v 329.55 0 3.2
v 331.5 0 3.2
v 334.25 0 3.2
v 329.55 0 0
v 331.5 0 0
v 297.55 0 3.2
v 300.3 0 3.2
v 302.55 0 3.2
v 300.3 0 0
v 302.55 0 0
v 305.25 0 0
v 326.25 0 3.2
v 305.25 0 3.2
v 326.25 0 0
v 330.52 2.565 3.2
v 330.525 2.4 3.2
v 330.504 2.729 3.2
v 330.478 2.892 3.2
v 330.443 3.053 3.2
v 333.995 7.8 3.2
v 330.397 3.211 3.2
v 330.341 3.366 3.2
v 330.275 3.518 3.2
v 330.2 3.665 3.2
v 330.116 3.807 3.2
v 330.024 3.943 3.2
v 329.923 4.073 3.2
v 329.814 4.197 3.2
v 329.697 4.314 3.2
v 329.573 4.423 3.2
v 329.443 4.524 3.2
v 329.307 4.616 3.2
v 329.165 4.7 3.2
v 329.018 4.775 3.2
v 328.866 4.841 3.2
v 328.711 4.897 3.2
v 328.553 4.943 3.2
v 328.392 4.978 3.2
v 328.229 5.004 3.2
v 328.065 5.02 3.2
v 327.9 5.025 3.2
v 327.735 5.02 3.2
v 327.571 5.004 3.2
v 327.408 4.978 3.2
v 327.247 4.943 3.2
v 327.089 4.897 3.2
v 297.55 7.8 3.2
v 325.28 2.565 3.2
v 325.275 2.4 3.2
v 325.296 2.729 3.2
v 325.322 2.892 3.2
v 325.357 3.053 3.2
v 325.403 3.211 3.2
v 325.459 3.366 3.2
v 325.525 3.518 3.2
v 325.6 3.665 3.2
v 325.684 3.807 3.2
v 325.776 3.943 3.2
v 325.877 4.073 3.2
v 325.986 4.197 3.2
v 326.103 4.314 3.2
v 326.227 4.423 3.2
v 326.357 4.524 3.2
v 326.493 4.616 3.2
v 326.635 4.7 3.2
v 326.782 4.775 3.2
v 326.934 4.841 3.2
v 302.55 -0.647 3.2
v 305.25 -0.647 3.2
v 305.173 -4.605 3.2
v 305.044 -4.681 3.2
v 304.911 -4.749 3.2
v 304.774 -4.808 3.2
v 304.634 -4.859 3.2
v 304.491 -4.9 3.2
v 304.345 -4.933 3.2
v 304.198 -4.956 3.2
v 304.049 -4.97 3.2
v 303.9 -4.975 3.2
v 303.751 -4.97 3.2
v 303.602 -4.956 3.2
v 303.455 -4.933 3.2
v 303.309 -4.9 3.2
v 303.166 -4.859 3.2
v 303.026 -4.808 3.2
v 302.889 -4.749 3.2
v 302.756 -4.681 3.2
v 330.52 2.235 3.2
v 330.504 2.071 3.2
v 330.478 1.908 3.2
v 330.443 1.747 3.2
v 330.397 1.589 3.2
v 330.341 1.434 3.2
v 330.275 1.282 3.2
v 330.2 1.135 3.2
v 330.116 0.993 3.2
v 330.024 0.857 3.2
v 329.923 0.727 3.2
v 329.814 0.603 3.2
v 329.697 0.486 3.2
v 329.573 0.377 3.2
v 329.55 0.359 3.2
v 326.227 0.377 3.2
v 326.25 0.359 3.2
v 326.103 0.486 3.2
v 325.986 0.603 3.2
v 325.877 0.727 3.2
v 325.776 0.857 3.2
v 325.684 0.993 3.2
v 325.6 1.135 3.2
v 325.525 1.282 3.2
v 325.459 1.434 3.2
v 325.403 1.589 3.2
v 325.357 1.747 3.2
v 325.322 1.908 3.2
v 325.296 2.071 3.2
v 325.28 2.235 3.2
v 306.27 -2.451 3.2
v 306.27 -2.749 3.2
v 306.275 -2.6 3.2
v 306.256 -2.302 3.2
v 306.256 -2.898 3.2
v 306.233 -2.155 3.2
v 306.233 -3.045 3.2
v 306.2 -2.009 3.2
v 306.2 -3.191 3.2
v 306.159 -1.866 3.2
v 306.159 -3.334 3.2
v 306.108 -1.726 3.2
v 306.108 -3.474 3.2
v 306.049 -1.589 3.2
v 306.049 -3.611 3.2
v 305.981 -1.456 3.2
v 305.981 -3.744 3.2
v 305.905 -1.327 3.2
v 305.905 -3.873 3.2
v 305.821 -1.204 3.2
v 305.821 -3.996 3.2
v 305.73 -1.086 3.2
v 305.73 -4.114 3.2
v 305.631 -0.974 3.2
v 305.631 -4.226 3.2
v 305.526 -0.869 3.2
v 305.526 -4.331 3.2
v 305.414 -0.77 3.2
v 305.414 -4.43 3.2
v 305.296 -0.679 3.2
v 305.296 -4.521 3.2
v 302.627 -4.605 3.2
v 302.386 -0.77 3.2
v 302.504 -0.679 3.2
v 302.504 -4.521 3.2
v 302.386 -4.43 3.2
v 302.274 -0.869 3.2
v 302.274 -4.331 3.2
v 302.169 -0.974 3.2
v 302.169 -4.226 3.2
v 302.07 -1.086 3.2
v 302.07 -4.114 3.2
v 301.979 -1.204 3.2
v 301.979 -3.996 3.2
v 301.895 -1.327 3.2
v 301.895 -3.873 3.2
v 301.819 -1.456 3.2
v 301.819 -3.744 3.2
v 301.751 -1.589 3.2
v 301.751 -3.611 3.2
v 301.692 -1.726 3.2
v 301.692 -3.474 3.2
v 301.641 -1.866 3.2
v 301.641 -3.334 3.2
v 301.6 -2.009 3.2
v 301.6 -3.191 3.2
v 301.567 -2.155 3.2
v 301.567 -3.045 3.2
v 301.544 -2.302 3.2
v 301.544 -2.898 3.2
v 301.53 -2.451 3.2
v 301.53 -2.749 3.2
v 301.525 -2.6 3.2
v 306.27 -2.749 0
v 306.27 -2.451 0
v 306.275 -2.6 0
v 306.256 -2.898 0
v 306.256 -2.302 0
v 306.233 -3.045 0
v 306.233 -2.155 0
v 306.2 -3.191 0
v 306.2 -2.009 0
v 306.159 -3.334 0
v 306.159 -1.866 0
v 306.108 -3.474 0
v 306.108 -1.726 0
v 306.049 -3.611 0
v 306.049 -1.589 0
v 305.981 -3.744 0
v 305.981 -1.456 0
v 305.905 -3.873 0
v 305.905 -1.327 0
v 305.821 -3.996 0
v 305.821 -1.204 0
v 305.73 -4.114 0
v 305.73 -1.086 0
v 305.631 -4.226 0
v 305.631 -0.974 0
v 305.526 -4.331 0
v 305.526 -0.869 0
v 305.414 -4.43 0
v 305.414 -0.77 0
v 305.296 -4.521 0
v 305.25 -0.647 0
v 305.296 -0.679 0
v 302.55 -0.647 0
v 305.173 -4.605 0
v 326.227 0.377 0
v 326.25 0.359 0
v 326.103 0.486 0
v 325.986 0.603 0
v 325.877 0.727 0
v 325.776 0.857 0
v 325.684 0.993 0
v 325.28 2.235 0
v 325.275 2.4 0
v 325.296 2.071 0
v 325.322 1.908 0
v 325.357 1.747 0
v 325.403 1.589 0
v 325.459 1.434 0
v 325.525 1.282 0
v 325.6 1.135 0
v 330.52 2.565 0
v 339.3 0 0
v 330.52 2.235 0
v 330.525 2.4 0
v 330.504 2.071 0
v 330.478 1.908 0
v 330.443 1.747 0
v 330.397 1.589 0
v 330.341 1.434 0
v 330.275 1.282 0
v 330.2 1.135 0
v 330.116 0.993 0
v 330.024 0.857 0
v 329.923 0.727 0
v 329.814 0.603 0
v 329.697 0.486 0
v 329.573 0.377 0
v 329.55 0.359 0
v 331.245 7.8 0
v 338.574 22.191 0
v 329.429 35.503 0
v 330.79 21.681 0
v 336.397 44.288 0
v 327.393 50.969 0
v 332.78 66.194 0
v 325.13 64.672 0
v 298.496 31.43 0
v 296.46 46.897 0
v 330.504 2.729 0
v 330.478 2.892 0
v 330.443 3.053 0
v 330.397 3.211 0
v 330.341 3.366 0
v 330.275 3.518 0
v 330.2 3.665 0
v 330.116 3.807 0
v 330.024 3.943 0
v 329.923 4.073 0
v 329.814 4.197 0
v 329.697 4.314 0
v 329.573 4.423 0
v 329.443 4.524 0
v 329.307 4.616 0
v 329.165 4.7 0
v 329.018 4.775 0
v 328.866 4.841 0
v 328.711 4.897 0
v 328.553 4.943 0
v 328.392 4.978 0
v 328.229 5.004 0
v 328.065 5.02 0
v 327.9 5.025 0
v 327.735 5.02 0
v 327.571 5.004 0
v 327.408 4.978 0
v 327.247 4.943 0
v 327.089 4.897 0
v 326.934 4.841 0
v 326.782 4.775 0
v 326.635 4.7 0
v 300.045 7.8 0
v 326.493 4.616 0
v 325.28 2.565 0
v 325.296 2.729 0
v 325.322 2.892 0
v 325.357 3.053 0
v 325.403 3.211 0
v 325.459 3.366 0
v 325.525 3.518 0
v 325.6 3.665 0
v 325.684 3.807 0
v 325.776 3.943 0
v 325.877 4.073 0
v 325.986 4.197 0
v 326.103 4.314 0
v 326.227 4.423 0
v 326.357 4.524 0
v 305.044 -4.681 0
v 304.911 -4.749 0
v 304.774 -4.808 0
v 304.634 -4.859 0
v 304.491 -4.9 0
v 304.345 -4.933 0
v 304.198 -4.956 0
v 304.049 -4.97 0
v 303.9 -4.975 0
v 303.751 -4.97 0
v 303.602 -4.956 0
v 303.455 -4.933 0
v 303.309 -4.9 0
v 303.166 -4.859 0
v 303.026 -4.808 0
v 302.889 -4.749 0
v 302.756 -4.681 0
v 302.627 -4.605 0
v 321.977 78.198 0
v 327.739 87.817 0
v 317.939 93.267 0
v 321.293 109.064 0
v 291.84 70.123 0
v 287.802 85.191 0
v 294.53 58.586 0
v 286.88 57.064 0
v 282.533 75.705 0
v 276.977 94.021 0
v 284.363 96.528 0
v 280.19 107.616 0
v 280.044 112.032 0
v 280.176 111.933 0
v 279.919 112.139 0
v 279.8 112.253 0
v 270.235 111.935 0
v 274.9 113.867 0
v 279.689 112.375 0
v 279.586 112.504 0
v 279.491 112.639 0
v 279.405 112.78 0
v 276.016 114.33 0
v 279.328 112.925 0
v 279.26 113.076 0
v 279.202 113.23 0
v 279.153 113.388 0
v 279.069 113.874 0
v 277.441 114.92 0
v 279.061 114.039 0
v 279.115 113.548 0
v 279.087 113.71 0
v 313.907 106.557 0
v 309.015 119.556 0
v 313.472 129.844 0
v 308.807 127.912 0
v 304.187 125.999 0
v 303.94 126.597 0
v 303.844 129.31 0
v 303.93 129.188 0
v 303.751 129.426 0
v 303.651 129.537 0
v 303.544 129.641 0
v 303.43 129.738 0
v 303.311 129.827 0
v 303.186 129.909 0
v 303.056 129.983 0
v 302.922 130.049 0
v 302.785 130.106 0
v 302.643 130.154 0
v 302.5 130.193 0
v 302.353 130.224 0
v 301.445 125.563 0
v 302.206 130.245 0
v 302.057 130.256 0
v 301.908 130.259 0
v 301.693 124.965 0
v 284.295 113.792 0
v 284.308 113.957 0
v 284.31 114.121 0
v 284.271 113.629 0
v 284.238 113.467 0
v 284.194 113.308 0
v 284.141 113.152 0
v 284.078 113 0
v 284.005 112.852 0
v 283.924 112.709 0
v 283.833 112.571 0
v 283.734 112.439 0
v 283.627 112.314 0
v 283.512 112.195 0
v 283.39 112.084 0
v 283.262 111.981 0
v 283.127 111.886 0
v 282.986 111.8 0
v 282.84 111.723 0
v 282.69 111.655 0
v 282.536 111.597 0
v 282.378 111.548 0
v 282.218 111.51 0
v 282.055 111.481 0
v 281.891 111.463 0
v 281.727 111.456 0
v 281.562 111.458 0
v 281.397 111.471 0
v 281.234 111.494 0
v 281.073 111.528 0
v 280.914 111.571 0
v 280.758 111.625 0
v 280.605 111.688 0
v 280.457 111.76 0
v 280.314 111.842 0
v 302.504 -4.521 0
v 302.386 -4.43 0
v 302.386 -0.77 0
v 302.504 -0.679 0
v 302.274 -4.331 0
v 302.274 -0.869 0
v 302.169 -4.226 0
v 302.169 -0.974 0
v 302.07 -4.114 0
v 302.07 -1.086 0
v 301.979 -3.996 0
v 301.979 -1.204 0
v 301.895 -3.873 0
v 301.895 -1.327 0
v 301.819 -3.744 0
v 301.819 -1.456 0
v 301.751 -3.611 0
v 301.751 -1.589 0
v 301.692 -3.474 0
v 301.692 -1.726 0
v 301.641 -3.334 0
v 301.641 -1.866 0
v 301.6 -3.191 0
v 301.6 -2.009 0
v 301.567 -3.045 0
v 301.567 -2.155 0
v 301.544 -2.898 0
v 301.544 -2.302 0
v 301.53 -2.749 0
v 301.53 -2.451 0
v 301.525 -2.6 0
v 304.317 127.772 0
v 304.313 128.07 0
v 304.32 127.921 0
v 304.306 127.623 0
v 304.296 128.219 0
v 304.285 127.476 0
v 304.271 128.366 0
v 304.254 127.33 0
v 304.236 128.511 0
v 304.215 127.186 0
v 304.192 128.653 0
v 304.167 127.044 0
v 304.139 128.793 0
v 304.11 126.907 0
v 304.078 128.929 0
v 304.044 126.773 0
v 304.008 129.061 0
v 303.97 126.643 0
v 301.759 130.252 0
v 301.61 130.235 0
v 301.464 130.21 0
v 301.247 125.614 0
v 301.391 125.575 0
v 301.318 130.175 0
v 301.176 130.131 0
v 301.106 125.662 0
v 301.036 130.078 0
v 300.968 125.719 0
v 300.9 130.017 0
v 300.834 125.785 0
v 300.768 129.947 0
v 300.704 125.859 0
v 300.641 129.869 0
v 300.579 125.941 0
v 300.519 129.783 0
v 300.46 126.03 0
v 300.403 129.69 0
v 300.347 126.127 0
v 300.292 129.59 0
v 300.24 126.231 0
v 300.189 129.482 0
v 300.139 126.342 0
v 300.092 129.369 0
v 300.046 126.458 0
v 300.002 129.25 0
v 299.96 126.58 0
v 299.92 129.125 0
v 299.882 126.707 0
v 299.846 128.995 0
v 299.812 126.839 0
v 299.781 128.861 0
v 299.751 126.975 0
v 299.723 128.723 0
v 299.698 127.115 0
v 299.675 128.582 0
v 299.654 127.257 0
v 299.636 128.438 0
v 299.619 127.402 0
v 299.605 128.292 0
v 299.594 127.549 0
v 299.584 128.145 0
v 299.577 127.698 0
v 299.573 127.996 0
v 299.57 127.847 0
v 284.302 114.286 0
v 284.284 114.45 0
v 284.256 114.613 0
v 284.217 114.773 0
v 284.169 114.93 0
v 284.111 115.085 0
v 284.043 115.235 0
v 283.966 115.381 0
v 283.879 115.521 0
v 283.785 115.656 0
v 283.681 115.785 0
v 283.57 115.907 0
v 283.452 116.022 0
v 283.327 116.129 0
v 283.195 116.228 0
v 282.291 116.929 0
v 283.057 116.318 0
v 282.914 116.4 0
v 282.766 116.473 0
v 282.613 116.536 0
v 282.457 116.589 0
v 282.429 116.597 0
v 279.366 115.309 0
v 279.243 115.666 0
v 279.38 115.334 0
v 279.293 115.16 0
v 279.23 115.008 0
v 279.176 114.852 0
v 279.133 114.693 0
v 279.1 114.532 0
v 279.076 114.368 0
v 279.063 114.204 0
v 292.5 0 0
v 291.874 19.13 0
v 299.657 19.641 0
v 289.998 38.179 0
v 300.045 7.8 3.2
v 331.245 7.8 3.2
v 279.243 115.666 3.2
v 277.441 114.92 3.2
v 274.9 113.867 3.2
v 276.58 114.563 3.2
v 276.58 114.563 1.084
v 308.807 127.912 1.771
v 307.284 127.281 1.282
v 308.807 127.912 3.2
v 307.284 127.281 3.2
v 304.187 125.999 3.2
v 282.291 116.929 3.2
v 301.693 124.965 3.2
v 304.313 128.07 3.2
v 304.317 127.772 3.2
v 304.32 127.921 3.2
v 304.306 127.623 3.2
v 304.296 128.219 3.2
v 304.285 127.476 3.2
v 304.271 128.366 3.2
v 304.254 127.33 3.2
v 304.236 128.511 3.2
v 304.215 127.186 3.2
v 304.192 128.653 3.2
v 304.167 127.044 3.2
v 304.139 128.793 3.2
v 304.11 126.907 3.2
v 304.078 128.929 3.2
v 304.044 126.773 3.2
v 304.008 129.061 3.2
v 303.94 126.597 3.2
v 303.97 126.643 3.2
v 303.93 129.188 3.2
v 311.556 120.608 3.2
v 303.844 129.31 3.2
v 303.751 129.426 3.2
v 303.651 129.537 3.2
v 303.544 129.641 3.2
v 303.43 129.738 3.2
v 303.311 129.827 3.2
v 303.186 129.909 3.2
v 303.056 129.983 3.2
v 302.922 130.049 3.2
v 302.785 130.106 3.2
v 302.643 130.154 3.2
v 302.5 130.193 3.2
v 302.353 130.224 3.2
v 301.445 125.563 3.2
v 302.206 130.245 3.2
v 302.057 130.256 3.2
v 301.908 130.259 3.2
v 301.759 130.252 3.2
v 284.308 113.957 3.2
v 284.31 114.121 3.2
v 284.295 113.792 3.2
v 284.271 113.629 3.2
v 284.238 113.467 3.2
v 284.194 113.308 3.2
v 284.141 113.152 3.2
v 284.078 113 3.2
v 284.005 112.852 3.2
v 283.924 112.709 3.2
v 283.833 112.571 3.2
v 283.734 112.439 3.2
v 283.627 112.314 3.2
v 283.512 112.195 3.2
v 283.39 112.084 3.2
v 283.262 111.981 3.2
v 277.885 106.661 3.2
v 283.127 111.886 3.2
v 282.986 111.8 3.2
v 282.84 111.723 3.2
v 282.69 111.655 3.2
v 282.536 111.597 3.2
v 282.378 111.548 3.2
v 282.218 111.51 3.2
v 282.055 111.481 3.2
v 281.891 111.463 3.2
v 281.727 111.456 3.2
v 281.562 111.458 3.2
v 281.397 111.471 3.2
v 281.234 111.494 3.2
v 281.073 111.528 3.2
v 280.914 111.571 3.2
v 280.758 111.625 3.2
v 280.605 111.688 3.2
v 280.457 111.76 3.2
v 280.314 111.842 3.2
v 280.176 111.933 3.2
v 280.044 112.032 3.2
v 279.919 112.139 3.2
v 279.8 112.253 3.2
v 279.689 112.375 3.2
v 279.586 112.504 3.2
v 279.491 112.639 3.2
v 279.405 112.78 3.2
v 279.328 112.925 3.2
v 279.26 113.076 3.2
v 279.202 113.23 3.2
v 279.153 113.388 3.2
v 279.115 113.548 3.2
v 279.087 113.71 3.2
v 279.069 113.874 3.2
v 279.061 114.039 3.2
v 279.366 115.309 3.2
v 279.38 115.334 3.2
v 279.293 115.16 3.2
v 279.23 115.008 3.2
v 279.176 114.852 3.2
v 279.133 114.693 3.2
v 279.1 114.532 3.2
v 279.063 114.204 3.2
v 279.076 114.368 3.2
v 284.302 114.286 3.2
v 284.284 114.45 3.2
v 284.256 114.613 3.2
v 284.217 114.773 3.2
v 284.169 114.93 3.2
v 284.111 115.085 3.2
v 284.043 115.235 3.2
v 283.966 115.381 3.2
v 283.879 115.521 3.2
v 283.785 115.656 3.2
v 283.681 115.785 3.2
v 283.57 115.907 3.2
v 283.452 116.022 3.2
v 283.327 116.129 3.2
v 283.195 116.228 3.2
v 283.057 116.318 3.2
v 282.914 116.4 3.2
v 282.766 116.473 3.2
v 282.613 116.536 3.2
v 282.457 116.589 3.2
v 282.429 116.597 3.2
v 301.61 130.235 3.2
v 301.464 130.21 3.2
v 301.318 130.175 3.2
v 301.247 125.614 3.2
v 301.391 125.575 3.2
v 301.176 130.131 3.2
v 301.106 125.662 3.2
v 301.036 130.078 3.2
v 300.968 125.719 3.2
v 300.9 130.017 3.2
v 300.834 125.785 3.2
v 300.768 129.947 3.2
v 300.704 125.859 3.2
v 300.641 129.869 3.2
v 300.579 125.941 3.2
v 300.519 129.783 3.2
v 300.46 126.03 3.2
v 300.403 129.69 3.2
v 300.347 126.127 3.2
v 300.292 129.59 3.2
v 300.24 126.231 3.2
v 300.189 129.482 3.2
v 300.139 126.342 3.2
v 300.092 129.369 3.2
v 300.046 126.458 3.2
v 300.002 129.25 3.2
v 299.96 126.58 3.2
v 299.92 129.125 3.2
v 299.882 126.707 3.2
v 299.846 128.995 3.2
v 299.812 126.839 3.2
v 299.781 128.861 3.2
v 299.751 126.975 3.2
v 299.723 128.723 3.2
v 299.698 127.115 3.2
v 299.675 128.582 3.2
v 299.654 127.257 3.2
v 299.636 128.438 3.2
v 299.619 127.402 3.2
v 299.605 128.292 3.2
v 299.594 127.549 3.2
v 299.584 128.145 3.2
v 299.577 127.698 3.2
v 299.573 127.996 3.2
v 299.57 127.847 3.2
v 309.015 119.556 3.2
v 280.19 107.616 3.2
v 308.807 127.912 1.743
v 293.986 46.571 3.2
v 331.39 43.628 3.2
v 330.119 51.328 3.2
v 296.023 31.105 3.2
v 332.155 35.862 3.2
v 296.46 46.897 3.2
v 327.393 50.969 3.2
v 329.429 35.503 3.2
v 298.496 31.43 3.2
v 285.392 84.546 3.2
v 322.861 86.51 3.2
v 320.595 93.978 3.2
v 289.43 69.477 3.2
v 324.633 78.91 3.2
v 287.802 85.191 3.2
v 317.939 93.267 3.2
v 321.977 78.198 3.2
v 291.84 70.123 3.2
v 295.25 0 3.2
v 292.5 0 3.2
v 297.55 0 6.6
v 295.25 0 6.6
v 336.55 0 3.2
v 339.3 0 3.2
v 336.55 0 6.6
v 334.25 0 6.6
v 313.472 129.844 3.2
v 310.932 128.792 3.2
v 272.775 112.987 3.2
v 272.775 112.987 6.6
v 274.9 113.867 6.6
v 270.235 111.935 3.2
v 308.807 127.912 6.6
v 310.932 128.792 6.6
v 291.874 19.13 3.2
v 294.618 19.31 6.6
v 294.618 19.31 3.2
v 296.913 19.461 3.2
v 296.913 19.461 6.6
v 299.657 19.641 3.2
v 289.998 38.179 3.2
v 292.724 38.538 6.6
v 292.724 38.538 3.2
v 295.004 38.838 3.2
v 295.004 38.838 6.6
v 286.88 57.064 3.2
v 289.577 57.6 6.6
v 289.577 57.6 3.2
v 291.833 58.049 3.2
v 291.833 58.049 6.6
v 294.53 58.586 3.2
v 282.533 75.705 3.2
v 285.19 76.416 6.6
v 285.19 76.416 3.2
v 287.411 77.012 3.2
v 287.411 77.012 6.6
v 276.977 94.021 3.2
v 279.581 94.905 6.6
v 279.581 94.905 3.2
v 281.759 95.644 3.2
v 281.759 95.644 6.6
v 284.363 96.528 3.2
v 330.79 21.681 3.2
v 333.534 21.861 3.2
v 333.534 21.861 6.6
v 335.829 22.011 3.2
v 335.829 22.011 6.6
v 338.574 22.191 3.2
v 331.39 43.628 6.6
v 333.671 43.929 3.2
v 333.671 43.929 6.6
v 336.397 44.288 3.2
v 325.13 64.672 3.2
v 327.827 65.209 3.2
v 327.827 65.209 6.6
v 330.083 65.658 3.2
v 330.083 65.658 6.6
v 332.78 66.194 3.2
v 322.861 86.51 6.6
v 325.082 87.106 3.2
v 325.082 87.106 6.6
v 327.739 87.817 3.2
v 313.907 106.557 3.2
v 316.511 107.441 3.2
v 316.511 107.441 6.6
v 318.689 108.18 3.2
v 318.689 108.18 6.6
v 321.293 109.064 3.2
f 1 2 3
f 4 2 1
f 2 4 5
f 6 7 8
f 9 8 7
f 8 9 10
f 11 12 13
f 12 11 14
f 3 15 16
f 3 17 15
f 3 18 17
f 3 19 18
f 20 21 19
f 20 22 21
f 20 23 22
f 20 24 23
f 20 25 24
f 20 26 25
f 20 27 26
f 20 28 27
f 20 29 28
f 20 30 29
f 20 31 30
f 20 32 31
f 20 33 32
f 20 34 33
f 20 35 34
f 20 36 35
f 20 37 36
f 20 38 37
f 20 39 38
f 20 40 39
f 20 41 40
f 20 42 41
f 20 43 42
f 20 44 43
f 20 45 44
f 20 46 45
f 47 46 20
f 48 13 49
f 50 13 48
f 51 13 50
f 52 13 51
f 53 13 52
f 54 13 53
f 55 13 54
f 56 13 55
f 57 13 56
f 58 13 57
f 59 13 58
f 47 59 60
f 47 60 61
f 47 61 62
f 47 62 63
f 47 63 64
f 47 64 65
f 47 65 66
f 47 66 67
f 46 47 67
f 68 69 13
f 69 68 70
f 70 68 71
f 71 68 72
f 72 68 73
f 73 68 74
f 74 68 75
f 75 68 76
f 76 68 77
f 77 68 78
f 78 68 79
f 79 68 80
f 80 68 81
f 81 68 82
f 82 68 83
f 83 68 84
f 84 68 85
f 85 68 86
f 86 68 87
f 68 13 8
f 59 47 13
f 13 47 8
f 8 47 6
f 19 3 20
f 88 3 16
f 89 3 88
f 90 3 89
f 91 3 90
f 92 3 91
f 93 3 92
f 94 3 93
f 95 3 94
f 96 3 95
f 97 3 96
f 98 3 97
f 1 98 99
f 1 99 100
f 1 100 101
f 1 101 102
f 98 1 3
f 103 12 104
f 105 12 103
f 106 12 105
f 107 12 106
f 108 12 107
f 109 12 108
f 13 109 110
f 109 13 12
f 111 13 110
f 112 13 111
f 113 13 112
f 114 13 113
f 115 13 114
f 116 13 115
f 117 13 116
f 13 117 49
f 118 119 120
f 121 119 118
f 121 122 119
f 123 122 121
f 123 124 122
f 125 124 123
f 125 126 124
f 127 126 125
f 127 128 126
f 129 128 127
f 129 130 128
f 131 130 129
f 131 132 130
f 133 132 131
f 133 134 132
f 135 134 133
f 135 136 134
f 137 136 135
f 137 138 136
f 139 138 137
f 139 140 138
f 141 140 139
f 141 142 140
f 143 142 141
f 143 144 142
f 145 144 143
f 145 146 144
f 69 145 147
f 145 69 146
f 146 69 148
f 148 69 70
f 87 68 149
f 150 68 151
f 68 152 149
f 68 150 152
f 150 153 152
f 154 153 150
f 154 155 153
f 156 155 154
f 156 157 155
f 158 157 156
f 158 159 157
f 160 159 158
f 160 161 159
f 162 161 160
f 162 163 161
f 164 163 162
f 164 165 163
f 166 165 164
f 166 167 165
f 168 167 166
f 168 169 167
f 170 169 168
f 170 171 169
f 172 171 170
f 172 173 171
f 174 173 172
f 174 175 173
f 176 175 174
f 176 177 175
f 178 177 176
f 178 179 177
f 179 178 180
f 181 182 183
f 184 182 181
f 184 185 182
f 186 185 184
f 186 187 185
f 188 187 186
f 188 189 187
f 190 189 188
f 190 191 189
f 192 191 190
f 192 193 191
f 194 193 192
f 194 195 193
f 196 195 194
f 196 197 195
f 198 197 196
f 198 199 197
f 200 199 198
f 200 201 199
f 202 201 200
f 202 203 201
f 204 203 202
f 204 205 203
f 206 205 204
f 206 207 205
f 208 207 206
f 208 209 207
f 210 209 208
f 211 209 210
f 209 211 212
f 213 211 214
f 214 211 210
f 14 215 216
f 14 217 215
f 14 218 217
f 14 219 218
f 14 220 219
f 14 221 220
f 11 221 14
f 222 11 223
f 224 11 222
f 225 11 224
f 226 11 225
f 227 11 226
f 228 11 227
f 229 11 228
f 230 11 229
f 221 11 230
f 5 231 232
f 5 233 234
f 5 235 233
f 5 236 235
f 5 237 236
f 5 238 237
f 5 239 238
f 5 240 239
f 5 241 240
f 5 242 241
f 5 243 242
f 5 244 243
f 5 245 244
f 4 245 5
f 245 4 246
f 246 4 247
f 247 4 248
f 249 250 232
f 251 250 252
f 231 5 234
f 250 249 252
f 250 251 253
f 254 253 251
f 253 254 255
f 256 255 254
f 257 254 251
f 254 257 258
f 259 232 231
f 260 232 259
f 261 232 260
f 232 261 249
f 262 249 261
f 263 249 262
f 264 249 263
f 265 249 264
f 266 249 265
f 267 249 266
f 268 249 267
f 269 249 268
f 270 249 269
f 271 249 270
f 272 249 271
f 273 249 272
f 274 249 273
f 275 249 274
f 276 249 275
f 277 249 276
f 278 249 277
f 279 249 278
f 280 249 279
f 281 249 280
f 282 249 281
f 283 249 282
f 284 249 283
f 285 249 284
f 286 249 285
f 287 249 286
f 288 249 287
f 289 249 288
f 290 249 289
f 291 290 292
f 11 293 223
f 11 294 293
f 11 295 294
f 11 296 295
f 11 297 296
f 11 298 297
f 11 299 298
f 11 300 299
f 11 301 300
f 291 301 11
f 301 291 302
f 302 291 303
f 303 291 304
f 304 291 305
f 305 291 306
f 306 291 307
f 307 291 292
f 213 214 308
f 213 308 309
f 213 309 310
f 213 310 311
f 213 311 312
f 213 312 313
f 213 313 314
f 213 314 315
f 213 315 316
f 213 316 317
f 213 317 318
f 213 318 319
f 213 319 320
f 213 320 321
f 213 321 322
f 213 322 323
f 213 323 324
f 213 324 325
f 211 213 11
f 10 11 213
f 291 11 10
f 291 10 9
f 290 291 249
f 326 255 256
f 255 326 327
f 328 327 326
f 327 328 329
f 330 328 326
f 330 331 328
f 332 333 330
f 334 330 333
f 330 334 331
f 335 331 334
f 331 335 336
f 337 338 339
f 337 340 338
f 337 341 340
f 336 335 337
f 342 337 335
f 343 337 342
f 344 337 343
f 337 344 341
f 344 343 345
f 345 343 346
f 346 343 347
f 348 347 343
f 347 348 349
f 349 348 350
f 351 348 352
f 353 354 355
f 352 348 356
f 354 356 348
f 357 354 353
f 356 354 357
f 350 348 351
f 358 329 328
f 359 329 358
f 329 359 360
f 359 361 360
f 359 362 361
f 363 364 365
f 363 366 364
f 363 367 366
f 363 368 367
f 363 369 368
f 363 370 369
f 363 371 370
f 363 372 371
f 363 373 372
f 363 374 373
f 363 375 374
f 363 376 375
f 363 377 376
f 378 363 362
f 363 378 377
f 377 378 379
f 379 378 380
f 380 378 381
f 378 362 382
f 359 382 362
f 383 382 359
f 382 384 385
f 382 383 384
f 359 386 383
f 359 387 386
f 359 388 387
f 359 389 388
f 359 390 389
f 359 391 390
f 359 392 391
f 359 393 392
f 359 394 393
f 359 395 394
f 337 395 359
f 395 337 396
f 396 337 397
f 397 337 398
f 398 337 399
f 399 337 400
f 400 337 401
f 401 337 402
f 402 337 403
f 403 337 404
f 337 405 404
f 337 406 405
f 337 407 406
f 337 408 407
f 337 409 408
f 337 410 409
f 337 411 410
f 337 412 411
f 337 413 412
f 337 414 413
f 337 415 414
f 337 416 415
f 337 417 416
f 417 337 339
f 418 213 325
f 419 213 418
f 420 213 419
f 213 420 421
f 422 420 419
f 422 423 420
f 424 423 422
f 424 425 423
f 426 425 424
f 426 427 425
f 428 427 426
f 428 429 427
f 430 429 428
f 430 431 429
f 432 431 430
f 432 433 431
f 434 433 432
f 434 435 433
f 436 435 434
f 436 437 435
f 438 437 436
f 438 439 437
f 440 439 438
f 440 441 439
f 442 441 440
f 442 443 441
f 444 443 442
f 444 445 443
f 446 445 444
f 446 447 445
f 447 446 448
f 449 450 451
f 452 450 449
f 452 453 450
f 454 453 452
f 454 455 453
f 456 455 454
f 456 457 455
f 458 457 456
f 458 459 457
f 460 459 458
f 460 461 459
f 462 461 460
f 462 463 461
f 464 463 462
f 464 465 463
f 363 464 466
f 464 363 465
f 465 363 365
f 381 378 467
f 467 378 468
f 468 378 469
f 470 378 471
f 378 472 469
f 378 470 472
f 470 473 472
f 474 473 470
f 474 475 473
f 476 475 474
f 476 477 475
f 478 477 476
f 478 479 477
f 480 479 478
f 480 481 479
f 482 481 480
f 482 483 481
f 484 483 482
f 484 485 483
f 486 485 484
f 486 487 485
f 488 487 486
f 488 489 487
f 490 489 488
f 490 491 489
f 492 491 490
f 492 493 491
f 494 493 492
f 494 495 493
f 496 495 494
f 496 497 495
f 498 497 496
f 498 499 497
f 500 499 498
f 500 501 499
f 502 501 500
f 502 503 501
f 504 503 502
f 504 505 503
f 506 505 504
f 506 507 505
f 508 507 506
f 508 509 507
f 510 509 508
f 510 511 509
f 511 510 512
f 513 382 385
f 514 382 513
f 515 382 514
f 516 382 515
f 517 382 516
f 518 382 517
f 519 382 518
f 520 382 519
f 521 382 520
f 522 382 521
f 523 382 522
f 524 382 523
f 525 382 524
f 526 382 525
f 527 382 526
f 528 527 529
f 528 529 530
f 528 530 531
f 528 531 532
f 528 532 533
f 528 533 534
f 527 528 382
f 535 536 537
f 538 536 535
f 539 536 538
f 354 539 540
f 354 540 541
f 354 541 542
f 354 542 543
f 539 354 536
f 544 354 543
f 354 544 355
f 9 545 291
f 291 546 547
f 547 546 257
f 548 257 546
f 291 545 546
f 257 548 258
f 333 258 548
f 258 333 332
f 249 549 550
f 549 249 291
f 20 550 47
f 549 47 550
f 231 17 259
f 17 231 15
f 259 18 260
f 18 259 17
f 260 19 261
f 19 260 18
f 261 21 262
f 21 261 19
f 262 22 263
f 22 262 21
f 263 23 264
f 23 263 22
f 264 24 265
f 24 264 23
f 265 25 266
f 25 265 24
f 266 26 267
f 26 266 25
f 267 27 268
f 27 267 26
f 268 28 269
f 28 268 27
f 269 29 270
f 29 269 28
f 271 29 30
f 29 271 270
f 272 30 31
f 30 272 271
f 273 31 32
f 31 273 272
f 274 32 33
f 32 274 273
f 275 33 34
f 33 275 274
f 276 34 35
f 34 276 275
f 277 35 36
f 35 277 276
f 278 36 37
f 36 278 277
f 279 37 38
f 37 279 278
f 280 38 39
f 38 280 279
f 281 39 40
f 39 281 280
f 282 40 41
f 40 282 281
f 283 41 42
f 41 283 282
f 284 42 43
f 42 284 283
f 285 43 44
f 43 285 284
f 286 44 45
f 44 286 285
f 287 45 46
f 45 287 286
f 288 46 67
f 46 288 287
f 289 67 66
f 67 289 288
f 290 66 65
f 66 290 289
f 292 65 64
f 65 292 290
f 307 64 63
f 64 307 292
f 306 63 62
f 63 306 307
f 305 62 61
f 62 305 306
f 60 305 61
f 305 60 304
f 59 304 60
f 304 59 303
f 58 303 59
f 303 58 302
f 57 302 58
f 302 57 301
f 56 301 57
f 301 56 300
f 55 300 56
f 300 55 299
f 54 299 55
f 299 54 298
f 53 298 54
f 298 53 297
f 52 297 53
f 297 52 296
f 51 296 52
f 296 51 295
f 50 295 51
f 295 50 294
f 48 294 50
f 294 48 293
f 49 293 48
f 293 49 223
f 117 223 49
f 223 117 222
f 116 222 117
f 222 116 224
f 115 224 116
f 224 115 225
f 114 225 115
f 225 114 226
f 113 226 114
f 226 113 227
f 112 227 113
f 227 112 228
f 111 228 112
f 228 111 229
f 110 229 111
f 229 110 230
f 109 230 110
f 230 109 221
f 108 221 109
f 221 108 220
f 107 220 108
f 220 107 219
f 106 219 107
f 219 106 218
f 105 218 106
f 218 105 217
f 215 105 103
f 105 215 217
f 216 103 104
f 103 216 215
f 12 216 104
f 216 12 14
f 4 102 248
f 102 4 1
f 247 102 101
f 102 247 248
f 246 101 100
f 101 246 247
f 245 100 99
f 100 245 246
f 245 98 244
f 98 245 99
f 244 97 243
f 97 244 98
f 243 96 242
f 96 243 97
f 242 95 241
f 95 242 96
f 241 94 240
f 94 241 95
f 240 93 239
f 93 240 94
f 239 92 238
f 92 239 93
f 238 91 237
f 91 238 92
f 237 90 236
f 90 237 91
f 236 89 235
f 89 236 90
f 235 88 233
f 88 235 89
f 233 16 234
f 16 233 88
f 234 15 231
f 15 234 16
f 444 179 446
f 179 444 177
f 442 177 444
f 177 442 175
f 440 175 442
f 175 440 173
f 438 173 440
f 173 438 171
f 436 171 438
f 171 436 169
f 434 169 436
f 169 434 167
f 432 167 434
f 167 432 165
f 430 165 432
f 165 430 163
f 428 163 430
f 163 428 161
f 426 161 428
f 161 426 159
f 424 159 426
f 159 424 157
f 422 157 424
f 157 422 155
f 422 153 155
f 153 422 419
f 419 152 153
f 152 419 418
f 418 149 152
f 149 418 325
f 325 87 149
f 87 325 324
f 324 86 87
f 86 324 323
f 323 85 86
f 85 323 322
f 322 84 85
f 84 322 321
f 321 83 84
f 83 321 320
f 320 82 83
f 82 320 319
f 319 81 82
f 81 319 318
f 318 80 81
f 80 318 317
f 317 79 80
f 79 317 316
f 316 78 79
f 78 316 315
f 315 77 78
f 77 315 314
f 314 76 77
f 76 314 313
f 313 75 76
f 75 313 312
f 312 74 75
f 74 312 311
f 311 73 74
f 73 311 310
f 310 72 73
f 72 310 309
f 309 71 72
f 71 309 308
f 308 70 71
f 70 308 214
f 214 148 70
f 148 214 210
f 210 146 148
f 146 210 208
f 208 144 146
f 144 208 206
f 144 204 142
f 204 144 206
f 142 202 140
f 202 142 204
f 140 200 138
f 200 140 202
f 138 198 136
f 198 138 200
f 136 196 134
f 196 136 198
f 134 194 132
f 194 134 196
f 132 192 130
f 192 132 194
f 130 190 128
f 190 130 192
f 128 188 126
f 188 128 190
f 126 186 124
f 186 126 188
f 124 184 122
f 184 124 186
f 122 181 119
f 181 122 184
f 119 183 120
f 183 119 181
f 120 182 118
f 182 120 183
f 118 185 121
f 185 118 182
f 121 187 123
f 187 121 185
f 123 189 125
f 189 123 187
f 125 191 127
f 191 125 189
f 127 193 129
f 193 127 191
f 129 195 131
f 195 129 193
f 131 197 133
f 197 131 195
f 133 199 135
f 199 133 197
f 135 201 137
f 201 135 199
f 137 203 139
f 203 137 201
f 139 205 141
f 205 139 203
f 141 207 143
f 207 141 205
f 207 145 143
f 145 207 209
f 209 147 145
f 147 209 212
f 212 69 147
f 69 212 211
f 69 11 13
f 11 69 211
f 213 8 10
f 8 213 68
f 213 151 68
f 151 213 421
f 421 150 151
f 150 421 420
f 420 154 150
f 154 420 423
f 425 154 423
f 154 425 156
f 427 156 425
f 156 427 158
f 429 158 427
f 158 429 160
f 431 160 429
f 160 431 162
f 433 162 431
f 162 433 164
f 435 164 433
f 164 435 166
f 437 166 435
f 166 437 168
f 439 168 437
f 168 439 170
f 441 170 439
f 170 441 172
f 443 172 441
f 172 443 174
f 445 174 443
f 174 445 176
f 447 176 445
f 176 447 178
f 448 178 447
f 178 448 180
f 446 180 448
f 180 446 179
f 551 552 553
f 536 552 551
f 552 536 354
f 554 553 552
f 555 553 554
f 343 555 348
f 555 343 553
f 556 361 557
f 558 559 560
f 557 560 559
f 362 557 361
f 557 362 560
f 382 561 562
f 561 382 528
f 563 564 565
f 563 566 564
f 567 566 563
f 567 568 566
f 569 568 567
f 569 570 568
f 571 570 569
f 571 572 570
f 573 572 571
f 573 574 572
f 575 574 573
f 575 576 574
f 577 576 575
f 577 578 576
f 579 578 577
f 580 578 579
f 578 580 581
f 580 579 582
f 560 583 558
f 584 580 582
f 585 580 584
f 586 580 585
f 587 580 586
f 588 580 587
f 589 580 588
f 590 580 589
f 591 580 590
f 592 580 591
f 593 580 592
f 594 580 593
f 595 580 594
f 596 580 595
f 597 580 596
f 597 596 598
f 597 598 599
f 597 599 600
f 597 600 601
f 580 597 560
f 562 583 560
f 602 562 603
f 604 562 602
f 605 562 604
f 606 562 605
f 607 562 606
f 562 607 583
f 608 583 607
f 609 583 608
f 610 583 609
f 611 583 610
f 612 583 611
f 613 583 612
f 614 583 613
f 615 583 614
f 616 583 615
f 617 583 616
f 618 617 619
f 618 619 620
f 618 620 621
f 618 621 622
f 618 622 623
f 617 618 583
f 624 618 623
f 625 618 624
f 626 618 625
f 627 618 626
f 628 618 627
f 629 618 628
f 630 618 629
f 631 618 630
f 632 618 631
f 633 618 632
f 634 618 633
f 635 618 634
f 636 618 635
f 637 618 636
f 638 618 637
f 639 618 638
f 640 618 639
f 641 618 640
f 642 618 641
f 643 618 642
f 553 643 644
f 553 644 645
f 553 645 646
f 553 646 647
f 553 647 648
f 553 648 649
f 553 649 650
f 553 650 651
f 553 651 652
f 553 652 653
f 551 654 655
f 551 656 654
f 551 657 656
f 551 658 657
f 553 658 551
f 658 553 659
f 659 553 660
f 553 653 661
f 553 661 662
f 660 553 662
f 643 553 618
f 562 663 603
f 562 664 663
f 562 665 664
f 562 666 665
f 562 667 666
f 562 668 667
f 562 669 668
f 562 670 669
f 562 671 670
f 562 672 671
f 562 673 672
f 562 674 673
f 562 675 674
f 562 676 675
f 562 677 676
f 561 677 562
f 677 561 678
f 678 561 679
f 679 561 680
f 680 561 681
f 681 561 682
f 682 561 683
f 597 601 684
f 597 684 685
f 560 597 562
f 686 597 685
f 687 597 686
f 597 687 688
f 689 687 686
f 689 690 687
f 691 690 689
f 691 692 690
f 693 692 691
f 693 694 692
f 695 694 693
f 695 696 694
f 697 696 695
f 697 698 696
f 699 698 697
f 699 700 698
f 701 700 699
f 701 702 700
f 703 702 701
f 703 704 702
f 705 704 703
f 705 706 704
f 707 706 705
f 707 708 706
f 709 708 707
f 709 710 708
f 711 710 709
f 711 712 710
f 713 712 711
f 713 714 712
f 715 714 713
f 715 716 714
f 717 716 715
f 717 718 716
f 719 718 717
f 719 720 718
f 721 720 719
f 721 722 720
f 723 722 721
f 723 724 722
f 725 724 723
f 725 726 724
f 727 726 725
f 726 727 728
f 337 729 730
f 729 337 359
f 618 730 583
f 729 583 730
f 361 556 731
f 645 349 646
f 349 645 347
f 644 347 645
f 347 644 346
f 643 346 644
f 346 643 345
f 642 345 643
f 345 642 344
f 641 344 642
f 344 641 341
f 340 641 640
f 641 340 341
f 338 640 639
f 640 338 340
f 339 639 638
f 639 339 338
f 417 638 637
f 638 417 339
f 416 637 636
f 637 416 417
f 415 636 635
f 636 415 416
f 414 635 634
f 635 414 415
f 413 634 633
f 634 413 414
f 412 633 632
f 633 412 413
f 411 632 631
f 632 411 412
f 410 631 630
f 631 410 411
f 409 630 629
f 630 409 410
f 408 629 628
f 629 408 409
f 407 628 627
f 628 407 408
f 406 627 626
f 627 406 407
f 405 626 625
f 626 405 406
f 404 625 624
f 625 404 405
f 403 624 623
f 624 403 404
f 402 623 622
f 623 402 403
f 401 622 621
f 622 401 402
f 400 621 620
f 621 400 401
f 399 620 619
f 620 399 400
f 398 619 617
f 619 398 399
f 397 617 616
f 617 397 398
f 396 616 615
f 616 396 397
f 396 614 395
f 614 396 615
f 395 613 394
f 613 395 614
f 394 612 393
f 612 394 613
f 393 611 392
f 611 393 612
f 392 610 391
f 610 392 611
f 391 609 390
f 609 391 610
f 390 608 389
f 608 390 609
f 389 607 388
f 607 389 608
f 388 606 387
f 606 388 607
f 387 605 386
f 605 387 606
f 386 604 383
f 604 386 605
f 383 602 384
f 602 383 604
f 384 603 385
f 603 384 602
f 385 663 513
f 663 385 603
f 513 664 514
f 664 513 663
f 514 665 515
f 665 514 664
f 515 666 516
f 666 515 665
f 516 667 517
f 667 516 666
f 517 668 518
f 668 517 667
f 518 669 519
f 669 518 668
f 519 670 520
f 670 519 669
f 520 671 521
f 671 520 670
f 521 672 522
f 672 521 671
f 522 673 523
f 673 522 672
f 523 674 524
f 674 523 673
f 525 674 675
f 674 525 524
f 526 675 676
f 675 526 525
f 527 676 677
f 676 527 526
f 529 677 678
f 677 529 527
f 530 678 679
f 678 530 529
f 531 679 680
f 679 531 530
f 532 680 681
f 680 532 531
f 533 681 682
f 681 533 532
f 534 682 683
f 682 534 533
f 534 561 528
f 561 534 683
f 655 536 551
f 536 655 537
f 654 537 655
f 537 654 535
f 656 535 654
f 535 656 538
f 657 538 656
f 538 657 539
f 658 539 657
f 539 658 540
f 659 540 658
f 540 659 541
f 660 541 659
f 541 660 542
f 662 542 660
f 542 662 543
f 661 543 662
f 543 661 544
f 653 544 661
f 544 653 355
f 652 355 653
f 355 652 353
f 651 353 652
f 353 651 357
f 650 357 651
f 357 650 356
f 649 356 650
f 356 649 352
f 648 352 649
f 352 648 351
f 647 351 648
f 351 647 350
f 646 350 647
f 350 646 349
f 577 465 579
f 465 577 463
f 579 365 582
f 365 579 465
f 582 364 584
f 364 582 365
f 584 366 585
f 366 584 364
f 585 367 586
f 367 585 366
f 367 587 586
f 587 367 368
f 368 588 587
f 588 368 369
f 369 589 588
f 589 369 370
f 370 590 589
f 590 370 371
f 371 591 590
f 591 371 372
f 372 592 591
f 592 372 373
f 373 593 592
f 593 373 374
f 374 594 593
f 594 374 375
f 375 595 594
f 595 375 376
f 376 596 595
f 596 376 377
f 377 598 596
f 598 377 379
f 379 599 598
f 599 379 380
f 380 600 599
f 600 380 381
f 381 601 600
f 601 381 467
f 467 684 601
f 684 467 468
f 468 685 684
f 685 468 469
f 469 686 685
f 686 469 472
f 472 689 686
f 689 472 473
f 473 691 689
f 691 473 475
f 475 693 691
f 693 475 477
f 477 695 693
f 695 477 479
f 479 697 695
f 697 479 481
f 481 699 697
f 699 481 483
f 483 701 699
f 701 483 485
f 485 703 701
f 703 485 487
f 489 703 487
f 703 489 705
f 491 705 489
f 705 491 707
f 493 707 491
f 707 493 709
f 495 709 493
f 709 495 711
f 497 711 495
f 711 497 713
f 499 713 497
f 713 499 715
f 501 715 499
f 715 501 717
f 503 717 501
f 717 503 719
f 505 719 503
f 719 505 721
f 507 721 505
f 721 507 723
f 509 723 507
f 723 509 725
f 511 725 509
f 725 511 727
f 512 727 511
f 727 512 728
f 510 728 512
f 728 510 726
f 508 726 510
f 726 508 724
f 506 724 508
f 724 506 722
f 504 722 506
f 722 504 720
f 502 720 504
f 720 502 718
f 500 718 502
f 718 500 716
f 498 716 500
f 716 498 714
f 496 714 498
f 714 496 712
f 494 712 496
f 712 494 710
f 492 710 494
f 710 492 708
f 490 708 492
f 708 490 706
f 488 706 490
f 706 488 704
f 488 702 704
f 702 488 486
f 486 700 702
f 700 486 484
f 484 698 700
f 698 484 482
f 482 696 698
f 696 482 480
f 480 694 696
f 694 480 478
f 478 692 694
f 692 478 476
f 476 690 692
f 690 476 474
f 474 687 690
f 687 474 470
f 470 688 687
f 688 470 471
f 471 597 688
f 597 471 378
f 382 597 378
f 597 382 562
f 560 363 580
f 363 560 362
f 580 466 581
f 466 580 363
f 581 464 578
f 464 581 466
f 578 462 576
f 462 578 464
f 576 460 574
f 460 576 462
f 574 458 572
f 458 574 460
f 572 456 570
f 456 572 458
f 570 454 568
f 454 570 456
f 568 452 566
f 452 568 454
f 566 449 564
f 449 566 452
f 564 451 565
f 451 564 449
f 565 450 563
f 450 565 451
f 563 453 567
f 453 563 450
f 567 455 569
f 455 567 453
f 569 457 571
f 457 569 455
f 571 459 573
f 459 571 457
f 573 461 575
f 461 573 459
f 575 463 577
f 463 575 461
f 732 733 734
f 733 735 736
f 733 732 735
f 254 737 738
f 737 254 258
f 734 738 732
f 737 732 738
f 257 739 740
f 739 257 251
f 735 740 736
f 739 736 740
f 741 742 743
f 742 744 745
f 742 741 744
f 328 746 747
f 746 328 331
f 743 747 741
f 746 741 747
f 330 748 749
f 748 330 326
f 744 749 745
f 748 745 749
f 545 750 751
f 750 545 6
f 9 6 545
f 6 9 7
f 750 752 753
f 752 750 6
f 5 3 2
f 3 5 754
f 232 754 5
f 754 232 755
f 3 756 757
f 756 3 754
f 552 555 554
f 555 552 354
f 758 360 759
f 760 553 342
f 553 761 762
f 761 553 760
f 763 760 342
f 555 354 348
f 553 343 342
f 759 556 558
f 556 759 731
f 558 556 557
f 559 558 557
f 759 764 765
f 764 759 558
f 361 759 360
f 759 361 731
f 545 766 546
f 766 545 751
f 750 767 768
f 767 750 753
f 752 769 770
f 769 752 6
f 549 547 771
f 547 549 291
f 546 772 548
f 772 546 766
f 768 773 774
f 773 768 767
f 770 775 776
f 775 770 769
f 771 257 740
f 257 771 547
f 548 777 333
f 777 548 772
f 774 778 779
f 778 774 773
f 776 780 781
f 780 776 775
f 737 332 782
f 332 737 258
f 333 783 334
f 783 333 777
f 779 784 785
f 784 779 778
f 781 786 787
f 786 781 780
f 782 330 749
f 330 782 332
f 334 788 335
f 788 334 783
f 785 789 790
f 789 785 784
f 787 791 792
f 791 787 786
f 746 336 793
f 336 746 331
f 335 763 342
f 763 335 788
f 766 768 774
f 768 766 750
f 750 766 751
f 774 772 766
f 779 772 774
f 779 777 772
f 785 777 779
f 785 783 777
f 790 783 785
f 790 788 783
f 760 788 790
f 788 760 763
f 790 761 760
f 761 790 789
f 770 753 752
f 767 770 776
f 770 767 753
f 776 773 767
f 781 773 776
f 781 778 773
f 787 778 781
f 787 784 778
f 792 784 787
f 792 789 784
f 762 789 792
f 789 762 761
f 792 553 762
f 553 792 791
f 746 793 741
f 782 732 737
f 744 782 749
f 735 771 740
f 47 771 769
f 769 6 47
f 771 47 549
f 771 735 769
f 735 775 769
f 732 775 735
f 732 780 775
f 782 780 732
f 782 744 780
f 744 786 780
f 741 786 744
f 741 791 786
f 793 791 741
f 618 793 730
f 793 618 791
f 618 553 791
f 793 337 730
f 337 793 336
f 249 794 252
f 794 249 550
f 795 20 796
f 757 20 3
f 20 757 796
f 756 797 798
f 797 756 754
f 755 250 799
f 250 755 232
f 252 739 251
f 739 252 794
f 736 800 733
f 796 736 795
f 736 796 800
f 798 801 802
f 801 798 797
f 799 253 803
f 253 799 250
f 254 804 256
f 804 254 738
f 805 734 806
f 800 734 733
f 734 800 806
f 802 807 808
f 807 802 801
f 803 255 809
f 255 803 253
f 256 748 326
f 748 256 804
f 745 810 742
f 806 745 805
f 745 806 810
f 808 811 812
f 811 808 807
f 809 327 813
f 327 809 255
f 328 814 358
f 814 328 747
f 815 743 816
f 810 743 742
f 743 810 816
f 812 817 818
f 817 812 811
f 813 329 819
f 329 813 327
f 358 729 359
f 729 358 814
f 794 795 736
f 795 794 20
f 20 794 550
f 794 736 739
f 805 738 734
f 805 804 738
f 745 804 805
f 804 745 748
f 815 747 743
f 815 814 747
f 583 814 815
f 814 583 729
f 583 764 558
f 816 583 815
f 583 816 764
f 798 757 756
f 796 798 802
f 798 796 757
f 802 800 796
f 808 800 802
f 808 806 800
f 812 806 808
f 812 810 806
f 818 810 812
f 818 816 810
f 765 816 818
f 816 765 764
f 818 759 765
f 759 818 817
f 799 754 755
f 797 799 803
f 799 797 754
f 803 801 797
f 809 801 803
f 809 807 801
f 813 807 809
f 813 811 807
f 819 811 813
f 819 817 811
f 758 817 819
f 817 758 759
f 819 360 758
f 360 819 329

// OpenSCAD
to_print = 200;

base_height = 3.2;
base_width = 7.8;
rail_height = 3.4;
rail_width = 2.3;
pseudo_gauge_multiple = 4;
connection_diameter = 5;
connection_diameter_scaling = 0.05;
connection_size = 2.5;
connection_width = 3;
connection_width_scaling = 0.1;
connection_uncenter = 12;
connection_expected_gap = 0.2;
gauge = base_width * pseudo_gauge_multiple + base_width - rail_width;


$fn = 100;

echo(str("Actual gauge is ", gauge));

module make_rail_section() {
    shift = (base_width - rail_width)/2;
    translate([-base_width/2, 0]) polygon([
        [0, 0],
        [base_width, 0],
        [base_width, base_height],
        [base_width - shift, base_height],
        [base_width - shift, base_height + rail_height],
        [shift, base_height + rail_height],
        [shift, base_height],
        [0, base_height]
    ]);
}

function universal_scale(value, scale_factor, scale_direction=0) =
    scale_direction == 0 ? value : (
        scale_direction > 0 ? value * (1 + scale_factor) : value * (1 - scale_factor)
    );

module make_connection_peg_2d(rescaled=0, extra_shoulder=0) {
    circle_diameter = universal_scale(
        connection_diameter,
        connection_diameter_scaling,
        rescaled
    );
    shoulder_width = universal_scale(
        connection_width,
        connection_width_scaling,
        rescaled
    );
    shoulder_length = connection_size + (
        rescaled == 0 ? 0 :
        (
            rescaled > 0 ? -connection_expected_gap/2 : +connection_expected_gap/2
        )
    );

    translate([shoulder_length, 0, 0]) {
        circle(d=circle_diameter);
    }
    translate([shoulder_length/2, 0]) {
        square([shoulder_length+extra_shoulder, shoulder_width], center=true);
    }

}

module make_connecting_crosstie() {
    difference() {
        translate([0, 0, base_height/2]) {
            cube([base_width, gauge, base_height], center=true);
        }
        translate([base_width/2, connection_uncenter, -base_height/2]) {
            rotate([0, 0, 180]) {
                linear_extrude(base_height*2) {
                    make_connection_peg_2d(1, 1);
                }
            }
        }
    }
    translate([base_width/2, -connection_uncenter]) {
        linear_extrude(base_height) {
            make_connection_peg_2d(-1, 1);
        }
    }
}

module make_straight_track(size) {
    rotate([90, 0, 90]) {
        linear_extrude(size * base_width) {
            translate([-gauge/2 - rail_width/2, 0]) make_rail_section();
            translate([+gauge/2 + rail_width/2, 0]) make_rail_section();
        }
    }
    rotate([0, 0, 180]) translate([-base_width/2, 0, 0]) {
        make_connecting_crosstie();
    }
    if (size > 5) {
        for (i=[1:size/4-1]) {
            translate([(4*i - 1)*base_width, -gauge/2, 0]) {
                cube([base_width*2, gauge, base_height]);
            }
        }
    }
    translate([-base_width/2 + (size)*base_width, 0, 0]) {
        make_connecting_crosstie();
    }
}

module make_curve_track() {
    curve_angle = 360/16;
    the_radius = 38*base_width;
    crosstie_offset = the_radius + gauge/2 + rail_width/2;
    crosstie_count = 3;
    rotate_extrude(convexity=4, angle=curve_angle) {
        translate([the_radius, 0]) make_rail_section();
        translate([the_radius+gauge+rail_width, 0]) make_rail_section();
    }
    translate([crosstie_offset, base_width/2, 0]) {
        rotate([0, 0, 270]) {
            make_connecting_crosstie();
        }
    }
    rotate([0, 0, curve_angle]) {
        translate([crosstie_offset, -base_width/2, 0]) {
            rotate([0, 0, 90]) {
                make_connecting_crosstie();
            }
        }
    }

    for (i=[1:crosstie_count-1]) {
        rotate([0, 0, i*curve_angle/crosstie_count]) {
            translate([crosstie_offset - gauge/2, -base_width, 0]) {
                cube([gauge, base_width*2, base_height]);
            }
        }
    }
}

module make_connection_test(monorail=false) {
    difference() {
        translate([0, 0, base_height/2]) {
            cube([base_width, base_width*4, base_height], center=true);
        }
        translate([base_width/2, base_width, -base_height/2]) {
            rotate([0, 0, 180]) {
                linear_extrude(base_height*2) {
                    make_connection_peg_2d(1, 1);
                }
            }
        }
    }
    translate([base_width/2, -base_width]) {
        linear_extrude(base_height) {
            make_connection_peg_2d(-1, 1);
        }
    }
    if (monorail) {
        translate([-base_width/2, 0, 0]) {
            rotate([90, 0, 90]) {
                linear_extrude(base_width) {
                    make_rail_section();
                }
            }
        }
    }
}

if ((to_print == 0) || (to_print == 1)) {
    make_connection_test(to_print == 1);
}

if ((to_print == 2) || (to_print == 3)) {
    make_connection_test(to_print == 3);
    translate([base_width+connection_expected_gap, 0, 0]) {
        rotate([0, 0, 180]) {
            make_connection_test(to_print == 3);
        }
    }
}

if (to_print == 10) {
    make_connecting_crosstie();
}

if ((to_print > 100) && (to_print < 200)) {
    make_straight_track(to_print - 100);
}

if (to_print == 200) {
    make_curve_track();
}
